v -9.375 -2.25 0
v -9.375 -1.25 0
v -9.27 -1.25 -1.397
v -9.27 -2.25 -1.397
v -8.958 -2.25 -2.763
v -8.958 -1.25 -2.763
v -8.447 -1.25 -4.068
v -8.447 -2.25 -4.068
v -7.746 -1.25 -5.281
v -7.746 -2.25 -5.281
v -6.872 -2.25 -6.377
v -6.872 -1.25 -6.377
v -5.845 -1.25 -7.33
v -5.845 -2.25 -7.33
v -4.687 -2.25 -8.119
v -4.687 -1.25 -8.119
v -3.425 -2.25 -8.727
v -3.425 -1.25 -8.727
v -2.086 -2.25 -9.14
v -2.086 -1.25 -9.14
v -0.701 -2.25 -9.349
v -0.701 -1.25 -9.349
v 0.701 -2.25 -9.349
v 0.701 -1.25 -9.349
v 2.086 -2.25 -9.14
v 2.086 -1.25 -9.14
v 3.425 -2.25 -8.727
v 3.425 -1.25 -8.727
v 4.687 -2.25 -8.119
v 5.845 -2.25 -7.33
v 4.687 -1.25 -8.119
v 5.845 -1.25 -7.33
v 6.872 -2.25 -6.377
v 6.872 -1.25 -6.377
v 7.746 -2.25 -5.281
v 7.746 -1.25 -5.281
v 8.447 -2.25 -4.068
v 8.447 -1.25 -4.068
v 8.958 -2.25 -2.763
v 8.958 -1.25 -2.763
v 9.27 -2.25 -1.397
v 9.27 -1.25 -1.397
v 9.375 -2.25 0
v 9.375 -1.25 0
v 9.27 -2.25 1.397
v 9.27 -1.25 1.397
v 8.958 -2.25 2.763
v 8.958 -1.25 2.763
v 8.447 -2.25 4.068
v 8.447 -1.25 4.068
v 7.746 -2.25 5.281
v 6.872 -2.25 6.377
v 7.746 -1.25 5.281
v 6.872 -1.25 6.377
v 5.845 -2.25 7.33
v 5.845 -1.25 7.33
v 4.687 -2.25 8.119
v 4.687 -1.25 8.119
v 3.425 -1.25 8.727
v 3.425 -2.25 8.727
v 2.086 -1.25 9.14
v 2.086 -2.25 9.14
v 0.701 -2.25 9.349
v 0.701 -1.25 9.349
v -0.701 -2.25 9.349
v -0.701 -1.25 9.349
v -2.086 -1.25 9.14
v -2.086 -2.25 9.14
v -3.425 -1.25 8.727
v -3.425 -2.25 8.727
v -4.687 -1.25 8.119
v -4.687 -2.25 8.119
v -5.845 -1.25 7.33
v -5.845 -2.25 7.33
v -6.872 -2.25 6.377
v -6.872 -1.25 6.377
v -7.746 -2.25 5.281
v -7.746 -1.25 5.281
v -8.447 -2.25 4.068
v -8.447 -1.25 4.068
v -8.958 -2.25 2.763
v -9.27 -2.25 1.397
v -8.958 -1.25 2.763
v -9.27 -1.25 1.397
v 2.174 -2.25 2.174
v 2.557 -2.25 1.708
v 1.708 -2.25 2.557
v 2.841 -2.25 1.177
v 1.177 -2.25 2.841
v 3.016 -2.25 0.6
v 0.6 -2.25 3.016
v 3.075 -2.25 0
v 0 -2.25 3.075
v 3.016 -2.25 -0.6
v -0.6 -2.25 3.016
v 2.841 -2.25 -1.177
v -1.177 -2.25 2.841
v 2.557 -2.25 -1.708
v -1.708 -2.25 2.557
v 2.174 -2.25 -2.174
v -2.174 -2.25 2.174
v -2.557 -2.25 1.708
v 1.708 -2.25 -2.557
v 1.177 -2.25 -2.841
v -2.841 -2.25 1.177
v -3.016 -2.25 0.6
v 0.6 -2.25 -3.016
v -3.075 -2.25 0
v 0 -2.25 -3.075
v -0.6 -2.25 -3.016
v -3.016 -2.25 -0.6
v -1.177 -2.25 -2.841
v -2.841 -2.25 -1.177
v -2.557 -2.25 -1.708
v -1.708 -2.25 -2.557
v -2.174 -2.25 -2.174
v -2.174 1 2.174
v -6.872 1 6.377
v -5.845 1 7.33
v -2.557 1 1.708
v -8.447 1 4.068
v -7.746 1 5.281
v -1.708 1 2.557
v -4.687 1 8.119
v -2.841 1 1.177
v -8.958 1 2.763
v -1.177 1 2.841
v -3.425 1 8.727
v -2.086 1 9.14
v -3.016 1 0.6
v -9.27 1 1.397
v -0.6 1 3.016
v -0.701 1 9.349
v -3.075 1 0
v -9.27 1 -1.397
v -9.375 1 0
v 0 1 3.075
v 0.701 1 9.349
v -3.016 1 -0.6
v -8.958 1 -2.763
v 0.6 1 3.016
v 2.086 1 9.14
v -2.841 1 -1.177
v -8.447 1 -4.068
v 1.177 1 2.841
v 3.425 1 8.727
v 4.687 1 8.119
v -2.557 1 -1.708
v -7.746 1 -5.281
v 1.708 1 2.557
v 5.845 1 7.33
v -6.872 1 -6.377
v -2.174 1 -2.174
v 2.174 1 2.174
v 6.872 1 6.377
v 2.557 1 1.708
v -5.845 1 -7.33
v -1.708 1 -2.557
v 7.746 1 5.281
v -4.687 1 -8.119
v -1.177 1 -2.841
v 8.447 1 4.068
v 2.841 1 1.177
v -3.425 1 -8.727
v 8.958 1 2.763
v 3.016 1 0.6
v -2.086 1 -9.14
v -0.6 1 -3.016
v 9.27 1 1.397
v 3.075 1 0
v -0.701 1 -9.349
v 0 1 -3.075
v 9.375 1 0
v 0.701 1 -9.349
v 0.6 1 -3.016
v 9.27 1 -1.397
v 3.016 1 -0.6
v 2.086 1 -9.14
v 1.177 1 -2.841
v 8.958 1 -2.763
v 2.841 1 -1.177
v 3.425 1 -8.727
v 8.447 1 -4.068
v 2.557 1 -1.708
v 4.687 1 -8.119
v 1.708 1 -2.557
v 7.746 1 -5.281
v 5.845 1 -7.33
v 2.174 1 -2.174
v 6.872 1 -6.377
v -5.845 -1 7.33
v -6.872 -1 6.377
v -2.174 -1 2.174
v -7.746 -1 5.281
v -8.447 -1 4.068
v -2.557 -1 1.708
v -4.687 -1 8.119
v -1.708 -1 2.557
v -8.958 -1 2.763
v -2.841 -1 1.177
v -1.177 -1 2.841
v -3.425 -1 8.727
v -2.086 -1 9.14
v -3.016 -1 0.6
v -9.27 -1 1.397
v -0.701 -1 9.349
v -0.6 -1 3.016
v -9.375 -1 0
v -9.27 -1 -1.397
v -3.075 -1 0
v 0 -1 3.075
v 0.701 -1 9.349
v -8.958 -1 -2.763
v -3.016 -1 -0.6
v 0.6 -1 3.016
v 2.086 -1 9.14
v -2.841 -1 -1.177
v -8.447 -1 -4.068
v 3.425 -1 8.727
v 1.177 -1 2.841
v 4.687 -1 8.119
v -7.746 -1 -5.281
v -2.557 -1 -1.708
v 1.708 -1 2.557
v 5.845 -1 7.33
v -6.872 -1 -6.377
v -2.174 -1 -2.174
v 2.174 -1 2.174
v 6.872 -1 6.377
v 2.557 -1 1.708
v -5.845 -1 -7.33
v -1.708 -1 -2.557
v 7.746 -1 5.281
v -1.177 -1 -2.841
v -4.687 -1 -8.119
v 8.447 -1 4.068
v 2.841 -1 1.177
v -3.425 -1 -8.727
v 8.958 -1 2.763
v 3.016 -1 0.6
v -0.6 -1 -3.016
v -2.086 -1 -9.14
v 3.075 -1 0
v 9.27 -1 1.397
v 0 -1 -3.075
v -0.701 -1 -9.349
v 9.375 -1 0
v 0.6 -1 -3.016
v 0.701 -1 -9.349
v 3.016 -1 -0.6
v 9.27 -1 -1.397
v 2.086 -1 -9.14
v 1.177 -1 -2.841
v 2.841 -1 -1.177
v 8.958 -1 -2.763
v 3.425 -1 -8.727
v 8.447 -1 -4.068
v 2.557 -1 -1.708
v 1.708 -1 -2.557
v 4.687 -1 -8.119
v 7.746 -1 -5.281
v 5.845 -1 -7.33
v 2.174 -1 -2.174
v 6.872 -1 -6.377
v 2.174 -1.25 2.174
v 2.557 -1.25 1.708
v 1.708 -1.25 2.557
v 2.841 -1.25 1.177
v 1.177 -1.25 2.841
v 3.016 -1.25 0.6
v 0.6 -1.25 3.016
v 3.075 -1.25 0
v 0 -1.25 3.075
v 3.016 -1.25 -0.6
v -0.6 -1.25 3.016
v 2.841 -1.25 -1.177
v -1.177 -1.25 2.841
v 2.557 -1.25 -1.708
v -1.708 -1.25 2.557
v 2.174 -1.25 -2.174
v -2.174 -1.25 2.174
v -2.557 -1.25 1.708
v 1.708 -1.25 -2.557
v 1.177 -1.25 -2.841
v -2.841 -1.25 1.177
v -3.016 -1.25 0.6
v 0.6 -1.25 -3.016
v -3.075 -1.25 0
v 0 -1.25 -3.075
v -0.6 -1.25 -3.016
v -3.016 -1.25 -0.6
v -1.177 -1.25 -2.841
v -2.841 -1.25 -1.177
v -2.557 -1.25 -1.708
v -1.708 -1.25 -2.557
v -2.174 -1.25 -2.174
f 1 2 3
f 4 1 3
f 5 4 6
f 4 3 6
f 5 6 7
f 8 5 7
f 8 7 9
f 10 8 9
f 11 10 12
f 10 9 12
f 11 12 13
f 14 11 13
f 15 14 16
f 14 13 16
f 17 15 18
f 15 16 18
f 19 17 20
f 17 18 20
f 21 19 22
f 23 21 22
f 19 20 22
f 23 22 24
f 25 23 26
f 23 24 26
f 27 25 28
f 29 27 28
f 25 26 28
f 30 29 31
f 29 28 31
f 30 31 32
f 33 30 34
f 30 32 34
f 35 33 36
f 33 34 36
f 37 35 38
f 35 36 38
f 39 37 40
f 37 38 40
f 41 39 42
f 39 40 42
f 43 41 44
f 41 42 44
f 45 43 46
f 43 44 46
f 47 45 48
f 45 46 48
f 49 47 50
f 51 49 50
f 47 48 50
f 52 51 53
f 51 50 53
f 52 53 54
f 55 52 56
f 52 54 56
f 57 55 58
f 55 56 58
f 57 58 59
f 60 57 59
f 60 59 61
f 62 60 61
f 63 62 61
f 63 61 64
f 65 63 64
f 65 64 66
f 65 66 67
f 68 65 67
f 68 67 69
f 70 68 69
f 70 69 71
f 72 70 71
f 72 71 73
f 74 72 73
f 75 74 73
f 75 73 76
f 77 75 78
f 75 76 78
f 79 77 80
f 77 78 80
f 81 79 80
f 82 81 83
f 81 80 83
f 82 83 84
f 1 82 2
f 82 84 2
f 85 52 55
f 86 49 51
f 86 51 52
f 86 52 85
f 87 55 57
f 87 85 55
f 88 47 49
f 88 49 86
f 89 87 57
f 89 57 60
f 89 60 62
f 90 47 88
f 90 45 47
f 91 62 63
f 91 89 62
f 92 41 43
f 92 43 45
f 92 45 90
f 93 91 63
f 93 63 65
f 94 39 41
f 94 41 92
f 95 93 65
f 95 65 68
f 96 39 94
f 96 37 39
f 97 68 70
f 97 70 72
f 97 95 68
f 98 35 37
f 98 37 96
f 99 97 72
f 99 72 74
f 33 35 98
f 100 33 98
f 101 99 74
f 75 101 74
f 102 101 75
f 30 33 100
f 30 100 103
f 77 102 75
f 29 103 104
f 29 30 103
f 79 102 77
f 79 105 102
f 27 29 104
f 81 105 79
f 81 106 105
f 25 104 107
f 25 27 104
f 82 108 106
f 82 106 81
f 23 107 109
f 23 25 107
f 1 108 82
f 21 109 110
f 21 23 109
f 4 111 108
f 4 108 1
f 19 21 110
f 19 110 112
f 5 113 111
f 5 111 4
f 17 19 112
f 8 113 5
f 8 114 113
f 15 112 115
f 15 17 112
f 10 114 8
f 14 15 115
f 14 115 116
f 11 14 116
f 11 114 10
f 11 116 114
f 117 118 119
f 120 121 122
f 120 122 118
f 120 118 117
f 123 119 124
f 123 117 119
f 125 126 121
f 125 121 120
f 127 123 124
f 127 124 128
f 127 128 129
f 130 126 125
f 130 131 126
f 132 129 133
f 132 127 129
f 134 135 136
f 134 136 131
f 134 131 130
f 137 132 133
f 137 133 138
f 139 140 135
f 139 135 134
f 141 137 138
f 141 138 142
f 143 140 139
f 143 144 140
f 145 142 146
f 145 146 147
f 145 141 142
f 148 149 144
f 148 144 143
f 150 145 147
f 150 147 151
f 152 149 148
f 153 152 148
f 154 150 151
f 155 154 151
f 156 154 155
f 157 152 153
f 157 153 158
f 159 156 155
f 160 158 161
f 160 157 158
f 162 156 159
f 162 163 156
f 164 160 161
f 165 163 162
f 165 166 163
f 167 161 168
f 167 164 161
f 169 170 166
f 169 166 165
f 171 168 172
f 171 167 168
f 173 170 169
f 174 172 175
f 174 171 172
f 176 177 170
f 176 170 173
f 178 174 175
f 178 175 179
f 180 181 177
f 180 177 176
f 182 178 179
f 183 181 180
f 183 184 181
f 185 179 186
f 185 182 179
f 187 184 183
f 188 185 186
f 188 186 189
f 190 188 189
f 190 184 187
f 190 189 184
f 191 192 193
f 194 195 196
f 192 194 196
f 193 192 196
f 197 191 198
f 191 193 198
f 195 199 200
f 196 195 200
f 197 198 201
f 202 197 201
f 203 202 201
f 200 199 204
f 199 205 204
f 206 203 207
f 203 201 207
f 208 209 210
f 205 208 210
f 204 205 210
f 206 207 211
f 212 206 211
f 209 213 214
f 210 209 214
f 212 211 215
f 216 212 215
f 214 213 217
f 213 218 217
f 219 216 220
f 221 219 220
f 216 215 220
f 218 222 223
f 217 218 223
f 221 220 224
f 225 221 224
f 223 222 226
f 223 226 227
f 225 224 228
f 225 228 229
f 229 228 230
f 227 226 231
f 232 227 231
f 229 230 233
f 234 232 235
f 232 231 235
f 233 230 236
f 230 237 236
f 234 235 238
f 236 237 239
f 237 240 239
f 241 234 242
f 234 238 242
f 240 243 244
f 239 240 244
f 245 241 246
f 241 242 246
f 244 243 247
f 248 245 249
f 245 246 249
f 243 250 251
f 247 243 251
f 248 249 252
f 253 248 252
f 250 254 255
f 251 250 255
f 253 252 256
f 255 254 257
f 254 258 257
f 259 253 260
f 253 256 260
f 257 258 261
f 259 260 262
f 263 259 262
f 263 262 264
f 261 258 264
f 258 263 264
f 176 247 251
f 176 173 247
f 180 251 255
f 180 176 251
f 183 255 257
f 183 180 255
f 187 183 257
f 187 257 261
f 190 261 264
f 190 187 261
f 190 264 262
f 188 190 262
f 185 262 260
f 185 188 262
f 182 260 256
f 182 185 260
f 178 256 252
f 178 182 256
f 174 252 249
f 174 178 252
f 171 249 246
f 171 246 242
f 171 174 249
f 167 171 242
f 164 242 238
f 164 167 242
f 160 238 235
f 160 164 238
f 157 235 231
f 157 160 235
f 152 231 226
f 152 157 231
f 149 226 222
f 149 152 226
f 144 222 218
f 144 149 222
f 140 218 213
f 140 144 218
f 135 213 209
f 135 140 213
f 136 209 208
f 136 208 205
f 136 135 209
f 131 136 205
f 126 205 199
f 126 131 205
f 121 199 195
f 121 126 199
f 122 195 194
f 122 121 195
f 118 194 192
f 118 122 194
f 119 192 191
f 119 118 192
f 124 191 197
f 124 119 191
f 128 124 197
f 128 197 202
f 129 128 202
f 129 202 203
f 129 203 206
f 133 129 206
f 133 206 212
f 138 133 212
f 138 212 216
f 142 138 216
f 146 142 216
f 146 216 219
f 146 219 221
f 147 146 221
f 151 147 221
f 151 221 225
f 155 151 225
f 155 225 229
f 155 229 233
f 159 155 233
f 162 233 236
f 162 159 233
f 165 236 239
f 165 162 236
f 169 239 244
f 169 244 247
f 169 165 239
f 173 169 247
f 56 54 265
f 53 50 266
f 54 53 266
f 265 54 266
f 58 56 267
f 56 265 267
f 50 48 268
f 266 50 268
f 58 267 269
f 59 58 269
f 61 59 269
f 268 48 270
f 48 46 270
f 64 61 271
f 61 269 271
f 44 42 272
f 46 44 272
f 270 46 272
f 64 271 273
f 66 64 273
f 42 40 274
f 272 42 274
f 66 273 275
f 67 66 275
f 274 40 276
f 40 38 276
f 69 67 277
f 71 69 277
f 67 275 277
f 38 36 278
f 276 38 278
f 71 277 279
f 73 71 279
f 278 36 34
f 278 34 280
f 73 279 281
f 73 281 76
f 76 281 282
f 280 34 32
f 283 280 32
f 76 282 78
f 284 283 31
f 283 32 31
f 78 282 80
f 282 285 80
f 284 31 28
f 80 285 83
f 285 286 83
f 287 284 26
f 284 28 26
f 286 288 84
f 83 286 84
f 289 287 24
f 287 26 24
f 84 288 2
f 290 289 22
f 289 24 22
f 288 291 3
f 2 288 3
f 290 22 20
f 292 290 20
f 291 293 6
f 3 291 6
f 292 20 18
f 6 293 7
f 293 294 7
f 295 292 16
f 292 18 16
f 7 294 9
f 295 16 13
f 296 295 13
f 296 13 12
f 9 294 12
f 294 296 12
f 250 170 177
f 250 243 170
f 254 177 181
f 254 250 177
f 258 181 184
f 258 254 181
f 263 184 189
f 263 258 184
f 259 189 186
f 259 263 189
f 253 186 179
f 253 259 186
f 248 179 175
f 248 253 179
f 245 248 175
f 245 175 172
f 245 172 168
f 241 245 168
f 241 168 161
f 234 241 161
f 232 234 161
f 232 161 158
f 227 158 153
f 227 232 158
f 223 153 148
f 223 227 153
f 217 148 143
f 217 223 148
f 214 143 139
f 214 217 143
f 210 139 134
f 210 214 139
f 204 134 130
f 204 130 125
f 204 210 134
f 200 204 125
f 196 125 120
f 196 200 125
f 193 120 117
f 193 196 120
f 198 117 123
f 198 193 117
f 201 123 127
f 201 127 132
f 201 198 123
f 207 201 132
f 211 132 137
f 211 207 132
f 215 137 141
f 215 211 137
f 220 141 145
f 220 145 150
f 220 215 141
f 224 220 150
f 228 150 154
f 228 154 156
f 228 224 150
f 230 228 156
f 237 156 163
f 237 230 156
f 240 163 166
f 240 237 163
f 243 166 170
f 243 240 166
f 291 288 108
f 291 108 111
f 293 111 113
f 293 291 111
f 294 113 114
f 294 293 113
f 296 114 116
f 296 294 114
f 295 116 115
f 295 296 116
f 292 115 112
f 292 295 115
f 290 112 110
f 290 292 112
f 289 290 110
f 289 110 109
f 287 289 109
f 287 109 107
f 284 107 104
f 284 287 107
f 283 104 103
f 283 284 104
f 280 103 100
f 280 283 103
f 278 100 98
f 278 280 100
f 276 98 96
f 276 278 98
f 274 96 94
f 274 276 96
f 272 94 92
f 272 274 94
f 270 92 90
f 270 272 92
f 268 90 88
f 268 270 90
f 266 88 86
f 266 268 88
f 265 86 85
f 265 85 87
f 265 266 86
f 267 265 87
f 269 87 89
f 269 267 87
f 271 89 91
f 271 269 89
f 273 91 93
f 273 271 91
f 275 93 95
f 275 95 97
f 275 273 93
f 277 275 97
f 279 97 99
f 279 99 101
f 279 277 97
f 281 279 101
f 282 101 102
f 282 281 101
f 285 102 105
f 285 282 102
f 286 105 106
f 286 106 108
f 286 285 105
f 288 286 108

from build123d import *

# Parameters (mm, degrees)
SKETCH1_R           = 9.375
SKETCH1_R_2         = 3.075
BOSS_EXTRUDE1_DEPTH = 1
SKETCH2_R           = 9.375
SKETCH2_R_2         = 3.075
BOSS_EXTRUDE2_DEPTH = 1


with BuildPart() as part:
    # Sketch1 → Boss-Extrude1 (new body, symmetric)
    with BuildSketch(Plane(origin=(0, 0, 0), x_dir=(1, 0, 0), z_dir=(0, 1, 0))):
        Circle(SKETCH1_R)
        Circle(SKETCH1_R_2, mode=Mode.SUBTRACT)
    extrude(amount=BOSS_EXTRUDE1_DEPTH, both=True)


with BuildPart() as body_2:
    # Sketch2 → Boss-Extrude2 (new body)
    with BuildSketch(Plane(origin=(0, -1.25, 0), x_dir=(-1, 0, 0), z_dir=(0, -1, 0))):
        Circle(SKETCH2_R)
        Circle(SKETCH2_R_2, mode=Mode.SUBTRACT)
    extrude(amount=BOSS_EXTRUDE2_DEPTH)


solid = Compound([part.part, body_2.part])
